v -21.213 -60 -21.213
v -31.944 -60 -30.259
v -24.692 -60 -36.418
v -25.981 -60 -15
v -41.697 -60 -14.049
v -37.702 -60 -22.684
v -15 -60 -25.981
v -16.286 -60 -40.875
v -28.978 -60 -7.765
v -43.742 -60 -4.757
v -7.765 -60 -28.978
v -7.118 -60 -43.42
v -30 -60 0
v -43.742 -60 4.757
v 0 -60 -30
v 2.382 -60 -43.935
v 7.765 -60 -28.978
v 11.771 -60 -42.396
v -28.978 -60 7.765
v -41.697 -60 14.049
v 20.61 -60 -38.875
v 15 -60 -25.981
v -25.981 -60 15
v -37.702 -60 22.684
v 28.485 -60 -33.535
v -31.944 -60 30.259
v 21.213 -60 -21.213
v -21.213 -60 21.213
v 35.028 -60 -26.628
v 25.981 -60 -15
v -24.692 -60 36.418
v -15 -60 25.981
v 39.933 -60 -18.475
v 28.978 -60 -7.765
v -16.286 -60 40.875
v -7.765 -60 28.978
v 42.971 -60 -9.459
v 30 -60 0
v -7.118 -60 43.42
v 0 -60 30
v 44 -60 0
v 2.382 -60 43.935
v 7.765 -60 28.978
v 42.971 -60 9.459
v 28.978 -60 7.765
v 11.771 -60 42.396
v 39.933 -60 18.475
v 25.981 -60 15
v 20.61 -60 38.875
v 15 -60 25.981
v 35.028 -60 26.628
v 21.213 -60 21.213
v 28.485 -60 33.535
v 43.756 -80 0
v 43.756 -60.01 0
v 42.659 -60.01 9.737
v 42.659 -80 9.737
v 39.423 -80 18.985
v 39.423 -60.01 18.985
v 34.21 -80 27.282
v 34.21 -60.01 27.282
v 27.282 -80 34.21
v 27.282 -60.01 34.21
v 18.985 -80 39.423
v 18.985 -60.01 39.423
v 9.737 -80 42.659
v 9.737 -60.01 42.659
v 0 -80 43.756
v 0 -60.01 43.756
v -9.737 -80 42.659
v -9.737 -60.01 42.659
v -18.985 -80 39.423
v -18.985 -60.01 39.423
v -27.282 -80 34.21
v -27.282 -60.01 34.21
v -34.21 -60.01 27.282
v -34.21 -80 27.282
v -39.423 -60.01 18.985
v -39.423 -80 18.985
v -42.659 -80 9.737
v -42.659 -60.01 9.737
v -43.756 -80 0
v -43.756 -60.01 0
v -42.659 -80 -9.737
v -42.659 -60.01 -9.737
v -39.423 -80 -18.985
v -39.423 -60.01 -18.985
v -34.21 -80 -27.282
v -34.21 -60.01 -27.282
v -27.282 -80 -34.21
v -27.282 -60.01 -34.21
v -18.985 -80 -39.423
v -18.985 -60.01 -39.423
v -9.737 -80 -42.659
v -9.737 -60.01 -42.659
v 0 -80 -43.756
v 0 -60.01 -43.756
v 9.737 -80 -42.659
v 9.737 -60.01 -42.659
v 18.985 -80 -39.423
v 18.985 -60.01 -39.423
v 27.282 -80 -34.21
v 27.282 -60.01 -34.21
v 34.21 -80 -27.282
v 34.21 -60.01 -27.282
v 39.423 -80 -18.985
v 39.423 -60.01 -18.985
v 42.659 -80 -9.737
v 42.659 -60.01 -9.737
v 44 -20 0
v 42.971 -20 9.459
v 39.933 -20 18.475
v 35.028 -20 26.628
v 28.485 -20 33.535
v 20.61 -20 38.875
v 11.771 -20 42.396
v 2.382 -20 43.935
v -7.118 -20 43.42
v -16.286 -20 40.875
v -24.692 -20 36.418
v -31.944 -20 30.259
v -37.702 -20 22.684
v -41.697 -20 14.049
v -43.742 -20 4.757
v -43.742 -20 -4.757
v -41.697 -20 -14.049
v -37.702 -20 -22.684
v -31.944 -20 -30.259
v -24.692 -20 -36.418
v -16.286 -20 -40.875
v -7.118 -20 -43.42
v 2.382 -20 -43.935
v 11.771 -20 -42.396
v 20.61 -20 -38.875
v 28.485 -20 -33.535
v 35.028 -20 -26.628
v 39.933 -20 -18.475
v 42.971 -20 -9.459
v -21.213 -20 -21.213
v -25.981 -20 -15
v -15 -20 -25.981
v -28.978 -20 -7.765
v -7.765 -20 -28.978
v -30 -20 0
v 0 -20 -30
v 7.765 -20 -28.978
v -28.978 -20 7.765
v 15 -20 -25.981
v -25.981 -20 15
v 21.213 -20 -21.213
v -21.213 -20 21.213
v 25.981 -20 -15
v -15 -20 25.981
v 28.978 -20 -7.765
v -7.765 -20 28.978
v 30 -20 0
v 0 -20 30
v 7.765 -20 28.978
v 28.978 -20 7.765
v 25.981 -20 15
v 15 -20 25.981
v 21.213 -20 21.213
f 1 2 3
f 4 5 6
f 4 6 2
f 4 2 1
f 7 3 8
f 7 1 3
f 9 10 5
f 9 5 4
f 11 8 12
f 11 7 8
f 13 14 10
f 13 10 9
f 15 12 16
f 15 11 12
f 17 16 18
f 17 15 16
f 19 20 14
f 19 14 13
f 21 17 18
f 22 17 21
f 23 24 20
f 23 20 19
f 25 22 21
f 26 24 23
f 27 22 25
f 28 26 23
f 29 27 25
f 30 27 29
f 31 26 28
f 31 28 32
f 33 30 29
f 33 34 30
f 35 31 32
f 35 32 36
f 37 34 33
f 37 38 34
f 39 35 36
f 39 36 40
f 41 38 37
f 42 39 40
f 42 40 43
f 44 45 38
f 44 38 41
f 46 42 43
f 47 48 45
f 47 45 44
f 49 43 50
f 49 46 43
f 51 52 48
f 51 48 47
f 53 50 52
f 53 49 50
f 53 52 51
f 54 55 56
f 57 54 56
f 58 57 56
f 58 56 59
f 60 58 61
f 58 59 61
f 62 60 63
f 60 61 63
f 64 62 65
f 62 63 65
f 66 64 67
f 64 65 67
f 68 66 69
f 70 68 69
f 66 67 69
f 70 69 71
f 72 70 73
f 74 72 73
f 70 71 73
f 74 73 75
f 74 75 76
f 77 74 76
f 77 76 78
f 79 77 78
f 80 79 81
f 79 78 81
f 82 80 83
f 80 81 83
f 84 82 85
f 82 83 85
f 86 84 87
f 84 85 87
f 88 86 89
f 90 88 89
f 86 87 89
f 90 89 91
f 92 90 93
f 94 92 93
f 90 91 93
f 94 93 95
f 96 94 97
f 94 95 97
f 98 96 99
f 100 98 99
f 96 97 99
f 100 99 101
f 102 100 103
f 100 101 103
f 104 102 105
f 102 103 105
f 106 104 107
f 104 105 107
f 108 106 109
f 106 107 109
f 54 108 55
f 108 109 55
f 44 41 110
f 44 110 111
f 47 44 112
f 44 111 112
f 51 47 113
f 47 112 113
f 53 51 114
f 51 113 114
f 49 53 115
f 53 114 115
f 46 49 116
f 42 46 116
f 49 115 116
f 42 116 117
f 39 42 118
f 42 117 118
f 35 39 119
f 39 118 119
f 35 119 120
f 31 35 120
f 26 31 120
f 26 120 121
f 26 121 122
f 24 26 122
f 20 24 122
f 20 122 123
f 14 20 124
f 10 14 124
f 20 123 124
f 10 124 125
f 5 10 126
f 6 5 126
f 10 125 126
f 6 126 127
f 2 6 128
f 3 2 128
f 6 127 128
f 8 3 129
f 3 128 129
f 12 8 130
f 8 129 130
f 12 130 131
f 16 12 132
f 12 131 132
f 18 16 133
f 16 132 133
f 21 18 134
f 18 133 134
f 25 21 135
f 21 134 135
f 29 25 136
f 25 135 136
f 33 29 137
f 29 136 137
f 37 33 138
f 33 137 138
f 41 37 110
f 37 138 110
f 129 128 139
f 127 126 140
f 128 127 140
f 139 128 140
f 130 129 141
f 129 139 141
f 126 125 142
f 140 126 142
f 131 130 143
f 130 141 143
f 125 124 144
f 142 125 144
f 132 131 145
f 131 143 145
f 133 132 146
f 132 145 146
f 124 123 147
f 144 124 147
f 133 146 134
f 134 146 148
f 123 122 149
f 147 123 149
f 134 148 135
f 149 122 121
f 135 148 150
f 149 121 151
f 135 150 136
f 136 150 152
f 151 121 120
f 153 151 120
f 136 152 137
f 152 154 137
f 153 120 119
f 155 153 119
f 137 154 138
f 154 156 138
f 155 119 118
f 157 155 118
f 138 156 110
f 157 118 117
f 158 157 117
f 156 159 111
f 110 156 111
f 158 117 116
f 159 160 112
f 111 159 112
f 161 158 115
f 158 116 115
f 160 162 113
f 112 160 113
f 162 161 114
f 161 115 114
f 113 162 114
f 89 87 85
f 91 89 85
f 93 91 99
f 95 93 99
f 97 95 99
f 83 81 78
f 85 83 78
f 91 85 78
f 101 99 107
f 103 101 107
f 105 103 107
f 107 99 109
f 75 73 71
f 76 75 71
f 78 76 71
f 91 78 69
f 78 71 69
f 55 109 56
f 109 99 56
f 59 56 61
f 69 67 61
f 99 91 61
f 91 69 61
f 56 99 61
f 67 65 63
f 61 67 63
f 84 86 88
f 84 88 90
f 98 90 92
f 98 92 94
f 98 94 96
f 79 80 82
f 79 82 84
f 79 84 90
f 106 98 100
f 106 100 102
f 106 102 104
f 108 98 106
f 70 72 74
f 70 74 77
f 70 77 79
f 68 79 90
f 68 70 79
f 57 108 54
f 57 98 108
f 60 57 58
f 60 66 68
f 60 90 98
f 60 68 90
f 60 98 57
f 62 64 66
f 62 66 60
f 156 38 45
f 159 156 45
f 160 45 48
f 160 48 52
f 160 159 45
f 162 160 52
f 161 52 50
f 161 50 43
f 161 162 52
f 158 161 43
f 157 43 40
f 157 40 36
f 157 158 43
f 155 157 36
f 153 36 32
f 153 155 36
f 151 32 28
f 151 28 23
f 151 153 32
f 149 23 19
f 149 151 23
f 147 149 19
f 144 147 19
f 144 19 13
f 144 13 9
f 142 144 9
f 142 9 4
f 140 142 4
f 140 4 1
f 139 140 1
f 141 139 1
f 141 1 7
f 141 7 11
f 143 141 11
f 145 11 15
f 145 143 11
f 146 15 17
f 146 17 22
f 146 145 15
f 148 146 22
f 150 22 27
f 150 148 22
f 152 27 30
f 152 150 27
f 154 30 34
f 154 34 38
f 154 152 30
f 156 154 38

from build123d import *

# Parameters (mm, degrees)
F1_START = 20
F0_R     = 44
F0_R_2   = 30
F1_DEPTH = 40
F3_START = 60.01
F2_R     = 43.7564133354
F3_DEPTH = 19.99


with BuildPart() as f1:
    # F0 (on Front) → F1 (new body)
    with BuildSketch(Plane.XZ.offset(F1_START)):
        Circle(F0_R)
        Circle(F0_R_2, mode=Mode.SUBTRACT)
    extrude(amount=F1_DEPTH)


with BuildPart() as f3:
    # F2 (on Front) → F3 (new body)
    with BuildSketch(Plane.XZ.offset(F3_START)):
        Circle(F2_R)
    extrude(amount=F3_DEPTH)


solid = Compound([f1.part, f3.part])
